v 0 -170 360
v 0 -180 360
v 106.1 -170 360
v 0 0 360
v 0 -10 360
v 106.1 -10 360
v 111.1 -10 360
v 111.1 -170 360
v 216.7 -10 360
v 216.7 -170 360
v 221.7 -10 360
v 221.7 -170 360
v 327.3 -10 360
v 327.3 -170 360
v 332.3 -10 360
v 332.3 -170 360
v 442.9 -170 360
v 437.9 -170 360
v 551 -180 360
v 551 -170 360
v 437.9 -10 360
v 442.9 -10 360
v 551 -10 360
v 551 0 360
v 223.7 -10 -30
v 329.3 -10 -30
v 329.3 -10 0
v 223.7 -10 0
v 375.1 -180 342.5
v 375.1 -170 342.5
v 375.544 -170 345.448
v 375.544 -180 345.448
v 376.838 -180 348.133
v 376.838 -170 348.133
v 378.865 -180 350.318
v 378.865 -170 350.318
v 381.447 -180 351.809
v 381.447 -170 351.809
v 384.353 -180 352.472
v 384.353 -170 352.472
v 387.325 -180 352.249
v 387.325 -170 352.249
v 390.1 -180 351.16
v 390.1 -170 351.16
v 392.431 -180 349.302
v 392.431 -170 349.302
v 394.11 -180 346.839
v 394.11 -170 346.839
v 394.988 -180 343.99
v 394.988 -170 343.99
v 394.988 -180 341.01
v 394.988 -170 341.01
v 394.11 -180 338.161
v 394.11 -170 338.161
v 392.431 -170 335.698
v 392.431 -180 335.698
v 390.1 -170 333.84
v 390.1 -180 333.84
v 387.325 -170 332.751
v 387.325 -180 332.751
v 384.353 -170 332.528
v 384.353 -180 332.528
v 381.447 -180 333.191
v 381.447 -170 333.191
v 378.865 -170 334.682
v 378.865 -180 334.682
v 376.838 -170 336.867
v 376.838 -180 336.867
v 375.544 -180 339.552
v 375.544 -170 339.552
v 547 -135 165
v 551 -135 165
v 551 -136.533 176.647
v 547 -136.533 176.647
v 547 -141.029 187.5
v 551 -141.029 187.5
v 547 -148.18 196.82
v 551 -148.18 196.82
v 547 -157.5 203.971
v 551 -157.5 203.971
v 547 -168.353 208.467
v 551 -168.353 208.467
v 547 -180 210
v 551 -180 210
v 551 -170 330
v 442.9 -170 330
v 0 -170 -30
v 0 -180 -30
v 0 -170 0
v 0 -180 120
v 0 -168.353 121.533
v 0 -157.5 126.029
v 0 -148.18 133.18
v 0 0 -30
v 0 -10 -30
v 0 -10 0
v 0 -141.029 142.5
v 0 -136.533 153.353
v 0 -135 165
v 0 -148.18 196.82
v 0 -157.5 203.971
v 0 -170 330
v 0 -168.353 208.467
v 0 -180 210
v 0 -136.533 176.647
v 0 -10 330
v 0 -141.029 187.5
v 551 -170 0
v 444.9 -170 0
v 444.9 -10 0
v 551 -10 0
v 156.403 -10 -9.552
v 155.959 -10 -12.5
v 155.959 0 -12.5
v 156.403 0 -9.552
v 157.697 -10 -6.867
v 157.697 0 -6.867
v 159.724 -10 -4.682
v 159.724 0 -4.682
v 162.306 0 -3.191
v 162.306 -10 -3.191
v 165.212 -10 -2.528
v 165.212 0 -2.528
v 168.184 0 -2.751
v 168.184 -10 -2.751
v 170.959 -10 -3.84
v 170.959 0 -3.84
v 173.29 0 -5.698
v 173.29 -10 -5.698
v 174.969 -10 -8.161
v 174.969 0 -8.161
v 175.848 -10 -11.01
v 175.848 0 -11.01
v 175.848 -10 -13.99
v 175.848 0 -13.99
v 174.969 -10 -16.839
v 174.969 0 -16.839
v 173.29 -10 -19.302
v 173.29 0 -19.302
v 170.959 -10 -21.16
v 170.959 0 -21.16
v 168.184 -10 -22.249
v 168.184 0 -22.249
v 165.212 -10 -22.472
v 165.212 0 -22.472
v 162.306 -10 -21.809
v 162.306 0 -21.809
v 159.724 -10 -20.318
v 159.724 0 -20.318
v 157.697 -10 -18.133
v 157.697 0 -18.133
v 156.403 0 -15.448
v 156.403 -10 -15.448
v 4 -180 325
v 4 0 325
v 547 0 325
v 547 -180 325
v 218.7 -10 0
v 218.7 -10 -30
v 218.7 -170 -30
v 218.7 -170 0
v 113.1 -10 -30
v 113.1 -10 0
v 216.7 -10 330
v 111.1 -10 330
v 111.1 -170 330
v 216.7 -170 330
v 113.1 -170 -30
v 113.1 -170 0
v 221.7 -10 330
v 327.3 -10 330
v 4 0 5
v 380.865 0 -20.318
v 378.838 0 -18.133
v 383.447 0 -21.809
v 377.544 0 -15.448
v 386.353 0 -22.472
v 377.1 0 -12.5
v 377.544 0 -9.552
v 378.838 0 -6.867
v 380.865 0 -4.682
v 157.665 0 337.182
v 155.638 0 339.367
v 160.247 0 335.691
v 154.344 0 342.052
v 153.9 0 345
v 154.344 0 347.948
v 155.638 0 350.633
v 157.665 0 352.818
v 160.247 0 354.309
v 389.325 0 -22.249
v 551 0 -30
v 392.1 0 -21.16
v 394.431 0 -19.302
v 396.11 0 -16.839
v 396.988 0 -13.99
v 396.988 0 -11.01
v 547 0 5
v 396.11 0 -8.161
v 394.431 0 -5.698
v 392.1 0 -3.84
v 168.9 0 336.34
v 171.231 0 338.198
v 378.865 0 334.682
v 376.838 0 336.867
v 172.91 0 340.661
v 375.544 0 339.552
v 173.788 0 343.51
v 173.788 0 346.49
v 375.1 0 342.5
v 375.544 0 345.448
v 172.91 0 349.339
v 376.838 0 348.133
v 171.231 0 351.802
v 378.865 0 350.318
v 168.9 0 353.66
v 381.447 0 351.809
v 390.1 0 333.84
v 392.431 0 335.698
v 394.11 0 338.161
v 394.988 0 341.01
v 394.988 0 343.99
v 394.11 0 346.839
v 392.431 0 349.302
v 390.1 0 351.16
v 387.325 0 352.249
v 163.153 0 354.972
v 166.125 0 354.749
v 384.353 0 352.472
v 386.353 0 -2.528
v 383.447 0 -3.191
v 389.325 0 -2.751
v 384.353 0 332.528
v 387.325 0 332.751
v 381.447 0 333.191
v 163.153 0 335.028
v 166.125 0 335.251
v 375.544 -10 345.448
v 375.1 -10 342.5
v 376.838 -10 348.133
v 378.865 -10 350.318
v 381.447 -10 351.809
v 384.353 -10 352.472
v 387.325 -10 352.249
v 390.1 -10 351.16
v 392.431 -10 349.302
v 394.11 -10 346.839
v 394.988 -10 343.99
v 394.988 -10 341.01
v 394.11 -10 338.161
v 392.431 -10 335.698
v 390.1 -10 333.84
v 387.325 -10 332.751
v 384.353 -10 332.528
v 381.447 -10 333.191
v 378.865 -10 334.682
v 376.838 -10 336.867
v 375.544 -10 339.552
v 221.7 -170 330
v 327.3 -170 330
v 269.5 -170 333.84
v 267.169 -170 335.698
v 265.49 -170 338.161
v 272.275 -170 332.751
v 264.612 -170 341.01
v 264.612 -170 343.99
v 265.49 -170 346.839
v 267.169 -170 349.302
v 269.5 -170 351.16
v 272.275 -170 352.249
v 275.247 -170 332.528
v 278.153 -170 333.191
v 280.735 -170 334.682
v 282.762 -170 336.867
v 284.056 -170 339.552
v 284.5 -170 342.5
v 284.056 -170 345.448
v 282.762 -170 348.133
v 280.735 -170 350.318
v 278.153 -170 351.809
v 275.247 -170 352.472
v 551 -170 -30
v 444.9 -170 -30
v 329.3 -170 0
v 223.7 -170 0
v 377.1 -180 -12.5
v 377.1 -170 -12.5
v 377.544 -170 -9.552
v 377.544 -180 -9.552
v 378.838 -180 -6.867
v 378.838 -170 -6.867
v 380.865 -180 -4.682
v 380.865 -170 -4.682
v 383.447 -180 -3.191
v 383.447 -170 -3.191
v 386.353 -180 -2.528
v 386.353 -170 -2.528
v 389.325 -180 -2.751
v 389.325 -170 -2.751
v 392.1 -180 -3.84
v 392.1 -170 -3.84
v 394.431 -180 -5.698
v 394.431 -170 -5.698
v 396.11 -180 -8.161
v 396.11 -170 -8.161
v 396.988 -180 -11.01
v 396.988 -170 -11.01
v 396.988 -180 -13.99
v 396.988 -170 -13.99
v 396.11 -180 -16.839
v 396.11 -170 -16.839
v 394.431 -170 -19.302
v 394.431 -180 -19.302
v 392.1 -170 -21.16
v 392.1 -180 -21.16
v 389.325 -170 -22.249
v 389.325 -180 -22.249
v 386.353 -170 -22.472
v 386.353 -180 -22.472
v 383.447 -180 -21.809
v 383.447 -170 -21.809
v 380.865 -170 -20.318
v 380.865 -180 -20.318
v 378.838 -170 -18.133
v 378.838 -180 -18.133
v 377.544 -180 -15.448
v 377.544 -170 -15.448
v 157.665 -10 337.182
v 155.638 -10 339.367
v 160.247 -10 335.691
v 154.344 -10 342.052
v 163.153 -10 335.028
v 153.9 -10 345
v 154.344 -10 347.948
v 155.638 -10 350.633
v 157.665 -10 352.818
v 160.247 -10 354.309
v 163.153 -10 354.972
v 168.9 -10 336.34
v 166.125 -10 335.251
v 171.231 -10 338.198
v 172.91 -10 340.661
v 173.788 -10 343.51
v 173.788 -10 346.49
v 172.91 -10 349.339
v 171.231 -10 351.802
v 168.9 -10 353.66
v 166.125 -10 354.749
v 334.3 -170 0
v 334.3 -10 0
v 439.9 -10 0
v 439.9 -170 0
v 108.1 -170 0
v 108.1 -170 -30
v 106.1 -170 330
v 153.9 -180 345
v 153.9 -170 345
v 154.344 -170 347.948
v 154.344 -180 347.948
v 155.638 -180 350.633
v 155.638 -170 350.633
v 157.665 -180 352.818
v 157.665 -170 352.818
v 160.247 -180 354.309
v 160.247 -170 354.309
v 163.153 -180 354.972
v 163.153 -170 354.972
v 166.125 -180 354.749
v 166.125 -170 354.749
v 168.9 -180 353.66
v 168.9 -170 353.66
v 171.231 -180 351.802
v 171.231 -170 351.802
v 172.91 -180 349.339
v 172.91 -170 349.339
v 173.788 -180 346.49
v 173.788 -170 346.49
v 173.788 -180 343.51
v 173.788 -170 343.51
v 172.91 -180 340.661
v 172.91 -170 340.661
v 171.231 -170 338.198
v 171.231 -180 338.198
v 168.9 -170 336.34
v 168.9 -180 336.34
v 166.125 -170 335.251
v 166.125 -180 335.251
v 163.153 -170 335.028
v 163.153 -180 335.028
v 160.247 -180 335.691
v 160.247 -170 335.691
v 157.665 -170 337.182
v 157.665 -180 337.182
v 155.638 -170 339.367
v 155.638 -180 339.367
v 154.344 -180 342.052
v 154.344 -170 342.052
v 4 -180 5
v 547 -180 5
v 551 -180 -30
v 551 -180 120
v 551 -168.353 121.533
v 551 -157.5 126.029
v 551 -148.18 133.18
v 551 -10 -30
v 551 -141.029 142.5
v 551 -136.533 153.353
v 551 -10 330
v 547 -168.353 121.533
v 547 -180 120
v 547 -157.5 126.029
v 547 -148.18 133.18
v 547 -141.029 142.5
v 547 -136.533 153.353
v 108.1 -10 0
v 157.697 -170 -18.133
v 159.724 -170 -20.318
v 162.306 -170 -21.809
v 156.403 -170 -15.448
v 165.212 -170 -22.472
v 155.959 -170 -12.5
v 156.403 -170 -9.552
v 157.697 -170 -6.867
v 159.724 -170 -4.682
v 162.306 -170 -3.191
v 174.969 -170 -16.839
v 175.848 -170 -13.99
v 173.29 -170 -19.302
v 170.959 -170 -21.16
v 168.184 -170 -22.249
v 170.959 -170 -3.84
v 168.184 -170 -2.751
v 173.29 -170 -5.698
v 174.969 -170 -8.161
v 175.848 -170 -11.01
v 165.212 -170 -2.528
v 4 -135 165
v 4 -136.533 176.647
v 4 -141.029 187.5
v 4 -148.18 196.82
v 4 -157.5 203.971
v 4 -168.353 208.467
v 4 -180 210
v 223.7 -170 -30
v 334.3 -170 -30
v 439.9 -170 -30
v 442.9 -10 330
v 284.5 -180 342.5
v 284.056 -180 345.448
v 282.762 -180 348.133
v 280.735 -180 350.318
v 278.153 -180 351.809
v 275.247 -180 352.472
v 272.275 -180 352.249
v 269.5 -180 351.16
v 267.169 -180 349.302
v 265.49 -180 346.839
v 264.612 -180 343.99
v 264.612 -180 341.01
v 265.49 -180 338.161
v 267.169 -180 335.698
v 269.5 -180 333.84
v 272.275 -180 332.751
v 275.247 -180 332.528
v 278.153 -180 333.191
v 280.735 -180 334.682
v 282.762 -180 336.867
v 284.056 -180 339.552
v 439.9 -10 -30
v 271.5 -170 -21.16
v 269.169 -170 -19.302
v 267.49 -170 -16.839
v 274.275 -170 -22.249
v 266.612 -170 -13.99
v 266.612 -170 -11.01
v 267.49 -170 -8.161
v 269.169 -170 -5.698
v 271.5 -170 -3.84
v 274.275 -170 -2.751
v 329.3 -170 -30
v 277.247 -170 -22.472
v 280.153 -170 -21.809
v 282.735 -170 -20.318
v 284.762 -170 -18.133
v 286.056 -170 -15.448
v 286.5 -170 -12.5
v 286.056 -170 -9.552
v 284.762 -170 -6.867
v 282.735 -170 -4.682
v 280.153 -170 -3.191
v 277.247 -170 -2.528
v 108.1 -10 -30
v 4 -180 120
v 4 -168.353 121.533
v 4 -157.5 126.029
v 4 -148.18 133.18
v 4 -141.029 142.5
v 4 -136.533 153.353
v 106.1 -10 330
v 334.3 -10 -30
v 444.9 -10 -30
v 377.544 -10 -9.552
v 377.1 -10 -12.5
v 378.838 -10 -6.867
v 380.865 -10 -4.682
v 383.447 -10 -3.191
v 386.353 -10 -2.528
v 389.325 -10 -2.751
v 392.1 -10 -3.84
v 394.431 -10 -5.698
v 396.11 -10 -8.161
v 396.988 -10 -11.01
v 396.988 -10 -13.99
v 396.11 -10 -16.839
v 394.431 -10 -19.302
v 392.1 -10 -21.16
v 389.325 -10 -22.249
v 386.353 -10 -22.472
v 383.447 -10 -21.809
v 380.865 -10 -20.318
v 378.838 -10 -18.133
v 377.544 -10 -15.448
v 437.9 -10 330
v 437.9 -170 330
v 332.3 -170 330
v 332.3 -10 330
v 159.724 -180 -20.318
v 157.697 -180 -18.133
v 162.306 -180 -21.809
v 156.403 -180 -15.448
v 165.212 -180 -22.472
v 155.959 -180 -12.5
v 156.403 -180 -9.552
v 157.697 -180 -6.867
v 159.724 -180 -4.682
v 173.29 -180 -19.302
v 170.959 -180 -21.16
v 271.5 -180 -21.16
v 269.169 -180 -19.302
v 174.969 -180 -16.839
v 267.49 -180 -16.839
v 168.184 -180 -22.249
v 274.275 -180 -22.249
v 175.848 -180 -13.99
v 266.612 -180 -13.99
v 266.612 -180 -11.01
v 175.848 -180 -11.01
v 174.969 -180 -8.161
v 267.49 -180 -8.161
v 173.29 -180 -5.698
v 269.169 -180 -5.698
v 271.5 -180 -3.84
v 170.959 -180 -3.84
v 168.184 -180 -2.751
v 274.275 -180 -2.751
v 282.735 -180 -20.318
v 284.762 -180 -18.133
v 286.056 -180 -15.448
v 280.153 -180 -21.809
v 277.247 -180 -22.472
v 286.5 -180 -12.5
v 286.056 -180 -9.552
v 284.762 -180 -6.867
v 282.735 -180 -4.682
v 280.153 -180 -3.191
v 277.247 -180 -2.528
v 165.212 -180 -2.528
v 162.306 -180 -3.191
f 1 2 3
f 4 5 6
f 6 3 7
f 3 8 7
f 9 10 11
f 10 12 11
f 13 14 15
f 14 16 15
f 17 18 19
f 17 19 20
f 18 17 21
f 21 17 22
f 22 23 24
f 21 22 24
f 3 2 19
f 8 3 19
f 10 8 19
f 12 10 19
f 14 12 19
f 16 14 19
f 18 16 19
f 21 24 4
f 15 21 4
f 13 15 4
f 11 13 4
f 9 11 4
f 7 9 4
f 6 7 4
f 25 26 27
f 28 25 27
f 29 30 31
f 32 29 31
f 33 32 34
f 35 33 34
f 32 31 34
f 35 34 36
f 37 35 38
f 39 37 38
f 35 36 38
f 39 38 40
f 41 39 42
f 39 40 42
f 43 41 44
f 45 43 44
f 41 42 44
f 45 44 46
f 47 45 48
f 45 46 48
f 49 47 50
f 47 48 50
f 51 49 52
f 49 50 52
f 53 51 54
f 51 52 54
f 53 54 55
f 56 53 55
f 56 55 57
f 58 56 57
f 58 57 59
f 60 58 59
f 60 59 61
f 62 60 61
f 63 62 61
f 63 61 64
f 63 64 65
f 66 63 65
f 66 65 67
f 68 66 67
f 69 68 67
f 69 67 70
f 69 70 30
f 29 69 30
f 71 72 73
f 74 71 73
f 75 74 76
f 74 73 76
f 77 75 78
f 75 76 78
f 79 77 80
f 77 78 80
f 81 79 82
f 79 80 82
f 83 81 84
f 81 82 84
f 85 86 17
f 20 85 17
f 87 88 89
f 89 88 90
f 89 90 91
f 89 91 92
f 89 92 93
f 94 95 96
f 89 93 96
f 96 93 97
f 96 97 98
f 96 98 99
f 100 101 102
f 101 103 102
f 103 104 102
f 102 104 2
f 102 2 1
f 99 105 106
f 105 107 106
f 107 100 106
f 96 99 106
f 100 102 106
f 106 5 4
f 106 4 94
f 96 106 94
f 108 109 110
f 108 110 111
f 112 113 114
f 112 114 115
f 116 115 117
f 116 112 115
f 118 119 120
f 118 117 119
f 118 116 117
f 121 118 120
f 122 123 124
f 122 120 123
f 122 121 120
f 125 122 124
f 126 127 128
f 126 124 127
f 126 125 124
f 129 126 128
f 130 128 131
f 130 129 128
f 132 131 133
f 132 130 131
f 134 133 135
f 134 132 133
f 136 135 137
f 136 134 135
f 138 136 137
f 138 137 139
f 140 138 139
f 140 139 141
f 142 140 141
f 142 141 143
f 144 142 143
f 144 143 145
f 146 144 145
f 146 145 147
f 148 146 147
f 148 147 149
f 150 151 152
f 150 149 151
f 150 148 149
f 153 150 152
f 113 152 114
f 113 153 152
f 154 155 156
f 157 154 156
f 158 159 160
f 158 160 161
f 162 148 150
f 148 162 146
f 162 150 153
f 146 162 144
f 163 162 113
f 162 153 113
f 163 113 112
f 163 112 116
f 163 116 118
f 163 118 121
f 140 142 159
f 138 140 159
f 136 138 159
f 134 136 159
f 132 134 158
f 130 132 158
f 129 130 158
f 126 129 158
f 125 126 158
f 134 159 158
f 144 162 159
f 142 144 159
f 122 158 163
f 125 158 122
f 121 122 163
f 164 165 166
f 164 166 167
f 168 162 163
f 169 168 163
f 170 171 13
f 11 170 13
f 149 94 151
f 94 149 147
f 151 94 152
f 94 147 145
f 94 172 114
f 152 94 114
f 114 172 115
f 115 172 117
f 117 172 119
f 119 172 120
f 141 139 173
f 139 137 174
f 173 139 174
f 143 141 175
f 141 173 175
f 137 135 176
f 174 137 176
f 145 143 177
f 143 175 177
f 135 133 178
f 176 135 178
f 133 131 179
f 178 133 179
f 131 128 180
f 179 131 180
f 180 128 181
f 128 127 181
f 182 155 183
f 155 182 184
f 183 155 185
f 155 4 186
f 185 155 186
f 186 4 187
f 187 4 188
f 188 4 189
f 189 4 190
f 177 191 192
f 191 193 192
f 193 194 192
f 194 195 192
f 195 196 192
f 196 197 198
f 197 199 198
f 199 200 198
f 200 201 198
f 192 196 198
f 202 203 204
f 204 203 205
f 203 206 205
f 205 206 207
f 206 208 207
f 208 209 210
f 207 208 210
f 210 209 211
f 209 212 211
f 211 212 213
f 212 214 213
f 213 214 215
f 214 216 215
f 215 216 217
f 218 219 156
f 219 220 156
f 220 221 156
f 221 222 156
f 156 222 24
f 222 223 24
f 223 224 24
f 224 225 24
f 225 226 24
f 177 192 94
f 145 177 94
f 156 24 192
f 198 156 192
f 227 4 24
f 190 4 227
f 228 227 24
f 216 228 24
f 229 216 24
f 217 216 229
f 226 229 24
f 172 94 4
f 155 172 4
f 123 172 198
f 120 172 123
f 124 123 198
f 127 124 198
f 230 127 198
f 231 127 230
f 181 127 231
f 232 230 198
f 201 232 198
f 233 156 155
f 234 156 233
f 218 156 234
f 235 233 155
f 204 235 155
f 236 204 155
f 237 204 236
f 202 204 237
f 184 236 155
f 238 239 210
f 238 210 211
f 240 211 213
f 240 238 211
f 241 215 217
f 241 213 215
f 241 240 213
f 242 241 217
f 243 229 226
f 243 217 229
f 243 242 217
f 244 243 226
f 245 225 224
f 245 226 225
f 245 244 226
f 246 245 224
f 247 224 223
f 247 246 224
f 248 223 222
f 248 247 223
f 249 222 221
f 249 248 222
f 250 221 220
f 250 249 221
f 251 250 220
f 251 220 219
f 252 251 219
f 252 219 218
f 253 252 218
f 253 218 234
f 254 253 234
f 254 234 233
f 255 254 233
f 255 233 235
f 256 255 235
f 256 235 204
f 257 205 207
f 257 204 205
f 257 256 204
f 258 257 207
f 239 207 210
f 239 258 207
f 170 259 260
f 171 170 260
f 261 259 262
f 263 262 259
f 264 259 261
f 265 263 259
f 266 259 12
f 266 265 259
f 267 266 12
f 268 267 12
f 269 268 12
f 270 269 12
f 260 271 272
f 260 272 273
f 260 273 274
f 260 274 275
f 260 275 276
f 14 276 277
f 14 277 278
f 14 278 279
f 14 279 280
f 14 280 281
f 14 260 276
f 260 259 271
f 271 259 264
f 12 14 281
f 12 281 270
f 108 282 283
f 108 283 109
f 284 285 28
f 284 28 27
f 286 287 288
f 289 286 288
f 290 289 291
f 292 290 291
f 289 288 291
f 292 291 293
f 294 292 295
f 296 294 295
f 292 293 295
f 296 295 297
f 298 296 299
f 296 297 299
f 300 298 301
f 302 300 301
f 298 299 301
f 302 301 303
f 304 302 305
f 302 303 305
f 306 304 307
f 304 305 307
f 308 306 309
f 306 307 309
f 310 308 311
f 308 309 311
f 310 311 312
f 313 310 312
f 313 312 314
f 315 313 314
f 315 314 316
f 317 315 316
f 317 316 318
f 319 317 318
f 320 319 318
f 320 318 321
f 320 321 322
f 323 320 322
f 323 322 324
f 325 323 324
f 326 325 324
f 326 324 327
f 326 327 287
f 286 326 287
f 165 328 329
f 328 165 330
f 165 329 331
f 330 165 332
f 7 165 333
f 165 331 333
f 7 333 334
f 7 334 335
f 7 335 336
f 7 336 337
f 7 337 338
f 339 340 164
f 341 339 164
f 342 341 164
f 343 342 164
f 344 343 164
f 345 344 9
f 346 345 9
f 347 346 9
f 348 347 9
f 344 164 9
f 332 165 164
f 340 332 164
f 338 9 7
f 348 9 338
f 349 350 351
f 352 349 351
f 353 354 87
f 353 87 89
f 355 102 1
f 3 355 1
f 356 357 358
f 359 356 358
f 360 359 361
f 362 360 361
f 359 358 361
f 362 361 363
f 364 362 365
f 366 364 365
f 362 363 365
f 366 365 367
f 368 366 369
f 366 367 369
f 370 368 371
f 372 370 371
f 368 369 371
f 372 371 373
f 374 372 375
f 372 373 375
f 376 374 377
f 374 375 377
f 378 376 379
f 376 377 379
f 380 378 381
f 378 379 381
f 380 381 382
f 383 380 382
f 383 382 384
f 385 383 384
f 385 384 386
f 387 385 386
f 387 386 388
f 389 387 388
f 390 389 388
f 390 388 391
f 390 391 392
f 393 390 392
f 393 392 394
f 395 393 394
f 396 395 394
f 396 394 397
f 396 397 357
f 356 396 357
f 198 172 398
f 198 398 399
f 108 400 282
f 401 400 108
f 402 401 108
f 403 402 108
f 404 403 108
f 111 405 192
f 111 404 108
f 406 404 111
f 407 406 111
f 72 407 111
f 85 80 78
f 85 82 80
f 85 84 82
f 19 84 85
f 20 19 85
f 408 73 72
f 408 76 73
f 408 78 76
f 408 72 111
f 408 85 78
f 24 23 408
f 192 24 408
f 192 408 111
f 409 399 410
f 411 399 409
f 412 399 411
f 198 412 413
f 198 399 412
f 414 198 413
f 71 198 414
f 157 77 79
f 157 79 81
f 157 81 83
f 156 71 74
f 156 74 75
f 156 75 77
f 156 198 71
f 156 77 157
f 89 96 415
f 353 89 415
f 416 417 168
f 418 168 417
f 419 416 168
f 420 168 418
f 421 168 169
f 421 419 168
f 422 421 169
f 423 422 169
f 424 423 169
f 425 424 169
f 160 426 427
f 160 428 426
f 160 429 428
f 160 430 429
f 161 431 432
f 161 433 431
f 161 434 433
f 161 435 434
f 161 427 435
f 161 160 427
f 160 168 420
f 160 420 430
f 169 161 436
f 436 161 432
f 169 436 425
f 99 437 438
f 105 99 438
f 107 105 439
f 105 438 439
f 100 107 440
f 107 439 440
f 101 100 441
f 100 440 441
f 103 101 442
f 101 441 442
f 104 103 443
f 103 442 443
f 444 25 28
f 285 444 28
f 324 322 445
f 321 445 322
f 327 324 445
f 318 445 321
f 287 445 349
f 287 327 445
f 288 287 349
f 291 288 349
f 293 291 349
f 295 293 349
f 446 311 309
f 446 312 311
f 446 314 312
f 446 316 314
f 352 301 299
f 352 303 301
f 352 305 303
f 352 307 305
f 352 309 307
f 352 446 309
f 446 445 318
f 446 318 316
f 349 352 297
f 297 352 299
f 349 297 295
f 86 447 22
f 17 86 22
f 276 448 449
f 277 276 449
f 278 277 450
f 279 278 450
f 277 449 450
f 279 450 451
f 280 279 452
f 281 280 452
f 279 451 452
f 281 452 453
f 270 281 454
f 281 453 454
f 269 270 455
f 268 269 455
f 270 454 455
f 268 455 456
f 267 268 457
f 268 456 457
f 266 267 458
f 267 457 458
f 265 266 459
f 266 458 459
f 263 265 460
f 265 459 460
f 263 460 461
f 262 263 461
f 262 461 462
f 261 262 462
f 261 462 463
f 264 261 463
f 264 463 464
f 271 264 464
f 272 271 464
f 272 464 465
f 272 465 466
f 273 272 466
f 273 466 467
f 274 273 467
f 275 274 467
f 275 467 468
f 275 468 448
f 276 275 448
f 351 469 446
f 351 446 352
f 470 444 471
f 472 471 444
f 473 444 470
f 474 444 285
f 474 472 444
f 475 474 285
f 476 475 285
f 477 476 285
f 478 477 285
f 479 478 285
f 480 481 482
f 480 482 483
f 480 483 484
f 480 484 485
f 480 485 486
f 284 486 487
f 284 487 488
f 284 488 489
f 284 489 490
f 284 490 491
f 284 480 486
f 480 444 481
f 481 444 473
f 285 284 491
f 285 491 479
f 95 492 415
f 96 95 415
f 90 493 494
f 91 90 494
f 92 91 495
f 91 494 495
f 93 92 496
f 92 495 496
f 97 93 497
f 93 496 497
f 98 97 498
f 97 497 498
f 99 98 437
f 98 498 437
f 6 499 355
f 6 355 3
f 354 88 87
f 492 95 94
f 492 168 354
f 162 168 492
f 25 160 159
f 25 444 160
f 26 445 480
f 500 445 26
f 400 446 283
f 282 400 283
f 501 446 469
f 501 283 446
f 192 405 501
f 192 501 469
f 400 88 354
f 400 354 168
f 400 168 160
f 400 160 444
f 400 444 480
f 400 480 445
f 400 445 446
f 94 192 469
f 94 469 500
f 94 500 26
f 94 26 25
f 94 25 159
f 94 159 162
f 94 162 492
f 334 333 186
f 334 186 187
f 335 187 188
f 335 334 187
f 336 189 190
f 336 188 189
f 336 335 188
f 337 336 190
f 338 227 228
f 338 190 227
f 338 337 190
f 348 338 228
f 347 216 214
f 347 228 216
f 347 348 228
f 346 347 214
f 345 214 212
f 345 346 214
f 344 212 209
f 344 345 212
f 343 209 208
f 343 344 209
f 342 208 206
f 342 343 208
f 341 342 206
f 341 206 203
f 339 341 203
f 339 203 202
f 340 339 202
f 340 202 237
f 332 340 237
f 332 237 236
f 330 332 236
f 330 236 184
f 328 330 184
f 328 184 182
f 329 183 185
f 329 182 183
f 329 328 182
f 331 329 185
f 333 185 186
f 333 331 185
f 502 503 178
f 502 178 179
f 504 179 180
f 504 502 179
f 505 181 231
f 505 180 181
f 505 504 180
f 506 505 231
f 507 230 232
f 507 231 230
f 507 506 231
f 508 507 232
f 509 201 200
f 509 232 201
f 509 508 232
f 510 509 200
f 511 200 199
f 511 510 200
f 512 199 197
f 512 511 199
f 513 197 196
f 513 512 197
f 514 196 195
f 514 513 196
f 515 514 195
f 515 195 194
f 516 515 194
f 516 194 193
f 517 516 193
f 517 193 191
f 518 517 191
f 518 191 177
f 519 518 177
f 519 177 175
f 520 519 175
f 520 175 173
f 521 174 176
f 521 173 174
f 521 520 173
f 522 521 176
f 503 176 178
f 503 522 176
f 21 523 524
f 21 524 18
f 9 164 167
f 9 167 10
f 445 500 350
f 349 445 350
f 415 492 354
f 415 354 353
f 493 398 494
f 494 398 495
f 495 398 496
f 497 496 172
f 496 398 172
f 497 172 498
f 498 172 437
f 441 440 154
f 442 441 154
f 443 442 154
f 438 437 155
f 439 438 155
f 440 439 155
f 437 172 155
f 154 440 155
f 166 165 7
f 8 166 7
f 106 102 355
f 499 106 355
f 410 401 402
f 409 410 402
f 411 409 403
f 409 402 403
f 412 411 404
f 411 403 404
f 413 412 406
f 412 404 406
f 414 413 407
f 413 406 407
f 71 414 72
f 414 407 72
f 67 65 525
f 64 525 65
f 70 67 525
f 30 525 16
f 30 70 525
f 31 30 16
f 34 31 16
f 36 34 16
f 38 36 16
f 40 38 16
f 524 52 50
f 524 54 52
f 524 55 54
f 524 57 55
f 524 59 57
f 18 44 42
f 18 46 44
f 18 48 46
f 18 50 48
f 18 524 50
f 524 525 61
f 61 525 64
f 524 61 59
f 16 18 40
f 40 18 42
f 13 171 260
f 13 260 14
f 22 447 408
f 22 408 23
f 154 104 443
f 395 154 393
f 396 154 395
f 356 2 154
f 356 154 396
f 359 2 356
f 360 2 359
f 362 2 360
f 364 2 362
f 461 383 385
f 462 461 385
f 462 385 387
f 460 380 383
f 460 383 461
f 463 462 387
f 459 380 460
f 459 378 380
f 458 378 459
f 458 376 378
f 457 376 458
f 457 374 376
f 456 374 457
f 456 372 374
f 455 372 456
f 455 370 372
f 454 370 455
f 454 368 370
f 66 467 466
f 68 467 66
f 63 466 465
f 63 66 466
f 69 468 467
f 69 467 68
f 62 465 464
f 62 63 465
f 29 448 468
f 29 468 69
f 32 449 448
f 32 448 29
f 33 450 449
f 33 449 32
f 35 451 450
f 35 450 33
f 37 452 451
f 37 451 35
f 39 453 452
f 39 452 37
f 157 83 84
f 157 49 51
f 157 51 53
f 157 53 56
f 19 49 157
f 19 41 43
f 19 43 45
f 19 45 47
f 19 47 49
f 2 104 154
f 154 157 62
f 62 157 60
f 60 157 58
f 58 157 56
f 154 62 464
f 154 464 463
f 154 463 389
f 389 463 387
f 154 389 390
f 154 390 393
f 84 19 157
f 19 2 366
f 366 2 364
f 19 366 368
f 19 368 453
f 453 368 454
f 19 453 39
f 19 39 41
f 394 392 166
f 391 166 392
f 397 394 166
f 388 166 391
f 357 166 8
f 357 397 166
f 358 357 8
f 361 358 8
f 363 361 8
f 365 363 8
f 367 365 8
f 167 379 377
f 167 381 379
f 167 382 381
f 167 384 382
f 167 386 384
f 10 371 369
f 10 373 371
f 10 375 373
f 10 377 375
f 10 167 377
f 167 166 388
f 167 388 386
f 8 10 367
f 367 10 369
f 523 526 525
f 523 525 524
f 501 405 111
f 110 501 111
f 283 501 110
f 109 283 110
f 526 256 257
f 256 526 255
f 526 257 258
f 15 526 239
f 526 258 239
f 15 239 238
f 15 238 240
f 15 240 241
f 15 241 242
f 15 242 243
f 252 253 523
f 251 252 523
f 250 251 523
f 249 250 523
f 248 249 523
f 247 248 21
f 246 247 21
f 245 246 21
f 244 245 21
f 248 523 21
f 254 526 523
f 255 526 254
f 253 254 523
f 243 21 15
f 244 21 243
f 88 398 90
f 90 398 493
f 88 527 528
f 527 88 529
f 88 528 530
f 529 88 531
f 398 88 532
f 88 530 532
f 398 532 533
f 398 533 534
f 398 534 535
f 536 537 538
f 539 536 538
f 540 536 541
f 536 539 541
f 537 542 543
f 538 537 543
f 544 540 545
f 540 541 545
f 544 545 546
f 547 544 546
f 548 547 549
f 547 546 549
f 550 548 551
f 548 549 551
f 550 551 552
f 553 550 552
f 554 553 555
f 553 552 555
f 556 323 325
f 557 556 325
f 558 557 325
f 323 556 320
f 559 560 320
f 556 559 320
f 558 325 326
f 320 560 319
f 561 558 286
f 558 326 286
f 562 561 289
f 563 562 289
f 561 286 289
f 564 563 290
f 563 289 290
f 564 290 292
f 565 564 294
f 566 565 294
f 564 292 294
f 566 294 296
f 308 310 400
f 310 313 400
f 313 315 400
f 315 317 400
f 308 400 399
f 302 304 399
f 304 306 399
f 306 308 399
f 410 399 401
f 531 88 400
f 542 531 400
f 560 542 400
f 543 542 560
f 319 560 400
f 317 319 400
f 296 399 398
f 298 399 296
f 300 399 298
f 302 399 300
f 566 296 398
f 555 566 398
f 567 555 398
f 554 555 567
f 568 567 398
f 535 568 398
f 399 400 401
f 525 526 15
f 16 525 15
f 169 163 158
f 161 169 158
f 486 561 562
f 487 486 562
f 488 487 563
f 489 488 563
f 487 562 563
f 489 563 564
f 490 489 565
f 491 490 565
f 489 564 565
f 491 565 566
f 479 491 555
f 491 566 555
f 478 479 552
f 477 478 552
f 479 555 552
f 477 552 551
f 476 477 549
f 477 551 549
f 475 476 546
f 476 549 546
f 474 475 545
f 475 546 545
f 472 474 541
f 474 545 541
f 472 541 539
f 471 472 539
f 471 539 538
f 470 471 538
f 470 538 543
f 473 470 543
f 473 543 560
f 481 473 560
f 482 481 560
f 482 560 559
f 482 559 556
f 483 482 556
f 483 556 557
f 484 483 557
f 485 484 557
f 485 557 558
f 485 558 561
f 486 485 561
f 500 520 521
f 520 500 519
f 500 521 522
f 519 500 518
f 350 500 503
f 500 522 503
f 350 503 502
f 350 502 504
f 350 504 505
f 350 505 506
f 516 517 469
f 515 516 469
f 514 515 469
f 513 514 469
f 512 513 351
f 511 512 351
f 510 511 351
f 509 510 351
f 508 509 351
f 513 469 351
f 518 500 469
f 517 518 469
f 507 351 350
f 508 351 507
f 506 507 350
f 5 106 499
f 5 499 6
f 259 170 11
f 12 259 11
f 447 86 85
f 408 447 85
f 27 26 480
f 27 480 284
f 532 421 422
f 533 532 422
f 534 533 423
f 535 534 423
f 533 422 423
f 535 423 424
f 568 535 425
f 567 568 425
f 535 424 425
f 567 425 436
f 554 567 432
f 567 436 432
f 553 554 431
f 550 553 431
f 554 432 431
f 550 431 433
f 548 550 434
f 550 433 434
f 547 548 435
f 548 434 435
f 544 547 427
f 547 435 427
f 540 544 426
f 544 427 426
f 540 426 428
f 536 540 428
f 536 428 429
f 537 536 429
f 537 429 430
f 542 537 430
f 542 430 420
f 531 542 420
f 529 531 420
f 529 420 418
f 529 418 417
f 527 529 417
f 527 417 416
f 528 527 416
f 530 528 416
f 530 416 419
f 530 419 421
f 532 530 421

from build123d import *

# Parameters (mm, degrees)
F0_W      = 551
F0_H      = 330
F0_W_2    = 543
F0_H_2    = 320
F1_DEPTH  = 180
F3_DEPTH  = 551.001
F4_W      = 10
F4_H      = 30
F5_DEPTH  = 551
F6_W      = 5
F6_H      = 30
F7_DEPTH  = 160
F8_W      = 5
F8_H      = 30
F9_DEPTH  = 160
F10_R     = 10
F11_DEPTH = 25
F12_DEPTH = 170.001
F13_R     = 10
F14_DEPTH = 25


with BuildPart() as f1:
    # F0 (on Front) → F1 (new body)
    with BuildSketch(Plane.XZ):
        with Locations((275.5, 165)):
            Rectangle(F0_W, F0_H)
        with Locations((275.5, 165)):
            Rectangle(F0_W_2, F0_H_2, mode=Mode.SUBTRACT)
    extrude(amount=F1_DEPTH)

    # F2 (on face) → F3 (cut, through all)
    with BuildSketch(Plane.YZ.offset(551)):
        with BuildLine():
            Line((-180, 120), (-180, 210))
            ThreePointArc((-180, 210), (-225, 165), (-180, 120))
        make_face()
        with BuildLine():
            ThreePointArc((-180, 120), (-148.180195, 133.180195), (-135, 165))
            ThreePointArc((-135, 165), (-148.180195, 196.819805), (-180, 210))
            Line((-180, 210), (-180, 120))
        make_face()
    extrude(amount=-F3_DEPTH, mode=Mode.SUBTRACT)

    # F4 (on face) → F5 (join, through all)
    with BuildSketch(Plane.YZ.offset(551)):
        with Locations((-175, -15)):
            Rectangle(F4_W, F4_H)
        with Locations((-5, -15)):
            Rectangle(F4_W, F4_H)
        with Locations((-175, 345)):
            Rectangle(F4_W, F4_H)
        with Locations((-5, 345)):
            Rectangle(F4_W, F4_H)
    extrude(amount=-F5_DEPTH)

    # F6 (on face) → F7 (join, through all)
    with BuildSketch(Plane.XZ.offset(10)):
        with Locations((110.6, -15)):
            Rectangle(F6_W, F6_H)
        with Locations((221.2, -15)):
            Rectangle(F6_W, F6_H)
        with Locations((331.8, -15)):
            Rectangle(F6_W, F6_H)
        with Locations((442.4, -15)):
            Rectangle(F6_W, F6_H)
    extrude(amount=F7_DEPTH)

    # F8 (on face) → F9 (join, through all)
    with BuildSketch(Plane.XZ.offset(10)):
        with Locations((440.4, 345)):
            Rectangle(F8_W, F8_H)
        with Locations((329.8, 345)):
            Rectangle(F8_W, F8_H)
        with Locations((219.2, 345)):
            Rectangle(F8_W, F8_H)
        with Locations((108.6, 345)):
            Rectangle(F8_W, F8_H)
    extrude(amount=F9_DEPTH)

    # F10 (on face) → F11 (cut)
    with BuildSketch(Plane(origin=(0, -170, 0), x_dir=(-1, 0, 0), z_dir=(0, 1, 0))):
        with Locations((-165.959219, -12.5)):
            Circle(F10_R)
        with Locations((-387.1, -12.5)):
            Circle(F10_R)
        with Locations((-163.9, 345)):
            Circle(F10_R)
        with Locations((-385.1, 342.5)):
            Circle(F10_R)
    extrude(amount=-F11_DEPTH, mode=Mode.SUBTRACT)

    # F10 (on face) → F12 (cut, through all)
    with BuildSketch(Plane(origin=(0, -170, 0), x_dir=(-1, 0, 0), z_dir=(0, 1, 0))):
        with Locations((-163.9, 345)):
            Circle(F10_R)
        with Locations((-385.1, 342.5)):
            Circle(F10_R)
        with Locations((-165.959219, -12.5)):
            Circle(F10_R)
        with Locations((-387.1, -12.5)):
            Circle(F10_R)
    extrude(amount=F12_DEPTH, mode=Mode.SUBTRACT)

    # F13 (on face) → F14 (cut)
    with BuildSketch(Plane.XZ.offset(180)):
        with Locations((274.5, 342.5)):
            Circle(F13_R)
        with Locations((276.5, -12.5)):
            Circle(F13_R)
    extrude(amount=-F14_DEPTH, mode=Mode.SUBTRACT)


solid = f1.part
